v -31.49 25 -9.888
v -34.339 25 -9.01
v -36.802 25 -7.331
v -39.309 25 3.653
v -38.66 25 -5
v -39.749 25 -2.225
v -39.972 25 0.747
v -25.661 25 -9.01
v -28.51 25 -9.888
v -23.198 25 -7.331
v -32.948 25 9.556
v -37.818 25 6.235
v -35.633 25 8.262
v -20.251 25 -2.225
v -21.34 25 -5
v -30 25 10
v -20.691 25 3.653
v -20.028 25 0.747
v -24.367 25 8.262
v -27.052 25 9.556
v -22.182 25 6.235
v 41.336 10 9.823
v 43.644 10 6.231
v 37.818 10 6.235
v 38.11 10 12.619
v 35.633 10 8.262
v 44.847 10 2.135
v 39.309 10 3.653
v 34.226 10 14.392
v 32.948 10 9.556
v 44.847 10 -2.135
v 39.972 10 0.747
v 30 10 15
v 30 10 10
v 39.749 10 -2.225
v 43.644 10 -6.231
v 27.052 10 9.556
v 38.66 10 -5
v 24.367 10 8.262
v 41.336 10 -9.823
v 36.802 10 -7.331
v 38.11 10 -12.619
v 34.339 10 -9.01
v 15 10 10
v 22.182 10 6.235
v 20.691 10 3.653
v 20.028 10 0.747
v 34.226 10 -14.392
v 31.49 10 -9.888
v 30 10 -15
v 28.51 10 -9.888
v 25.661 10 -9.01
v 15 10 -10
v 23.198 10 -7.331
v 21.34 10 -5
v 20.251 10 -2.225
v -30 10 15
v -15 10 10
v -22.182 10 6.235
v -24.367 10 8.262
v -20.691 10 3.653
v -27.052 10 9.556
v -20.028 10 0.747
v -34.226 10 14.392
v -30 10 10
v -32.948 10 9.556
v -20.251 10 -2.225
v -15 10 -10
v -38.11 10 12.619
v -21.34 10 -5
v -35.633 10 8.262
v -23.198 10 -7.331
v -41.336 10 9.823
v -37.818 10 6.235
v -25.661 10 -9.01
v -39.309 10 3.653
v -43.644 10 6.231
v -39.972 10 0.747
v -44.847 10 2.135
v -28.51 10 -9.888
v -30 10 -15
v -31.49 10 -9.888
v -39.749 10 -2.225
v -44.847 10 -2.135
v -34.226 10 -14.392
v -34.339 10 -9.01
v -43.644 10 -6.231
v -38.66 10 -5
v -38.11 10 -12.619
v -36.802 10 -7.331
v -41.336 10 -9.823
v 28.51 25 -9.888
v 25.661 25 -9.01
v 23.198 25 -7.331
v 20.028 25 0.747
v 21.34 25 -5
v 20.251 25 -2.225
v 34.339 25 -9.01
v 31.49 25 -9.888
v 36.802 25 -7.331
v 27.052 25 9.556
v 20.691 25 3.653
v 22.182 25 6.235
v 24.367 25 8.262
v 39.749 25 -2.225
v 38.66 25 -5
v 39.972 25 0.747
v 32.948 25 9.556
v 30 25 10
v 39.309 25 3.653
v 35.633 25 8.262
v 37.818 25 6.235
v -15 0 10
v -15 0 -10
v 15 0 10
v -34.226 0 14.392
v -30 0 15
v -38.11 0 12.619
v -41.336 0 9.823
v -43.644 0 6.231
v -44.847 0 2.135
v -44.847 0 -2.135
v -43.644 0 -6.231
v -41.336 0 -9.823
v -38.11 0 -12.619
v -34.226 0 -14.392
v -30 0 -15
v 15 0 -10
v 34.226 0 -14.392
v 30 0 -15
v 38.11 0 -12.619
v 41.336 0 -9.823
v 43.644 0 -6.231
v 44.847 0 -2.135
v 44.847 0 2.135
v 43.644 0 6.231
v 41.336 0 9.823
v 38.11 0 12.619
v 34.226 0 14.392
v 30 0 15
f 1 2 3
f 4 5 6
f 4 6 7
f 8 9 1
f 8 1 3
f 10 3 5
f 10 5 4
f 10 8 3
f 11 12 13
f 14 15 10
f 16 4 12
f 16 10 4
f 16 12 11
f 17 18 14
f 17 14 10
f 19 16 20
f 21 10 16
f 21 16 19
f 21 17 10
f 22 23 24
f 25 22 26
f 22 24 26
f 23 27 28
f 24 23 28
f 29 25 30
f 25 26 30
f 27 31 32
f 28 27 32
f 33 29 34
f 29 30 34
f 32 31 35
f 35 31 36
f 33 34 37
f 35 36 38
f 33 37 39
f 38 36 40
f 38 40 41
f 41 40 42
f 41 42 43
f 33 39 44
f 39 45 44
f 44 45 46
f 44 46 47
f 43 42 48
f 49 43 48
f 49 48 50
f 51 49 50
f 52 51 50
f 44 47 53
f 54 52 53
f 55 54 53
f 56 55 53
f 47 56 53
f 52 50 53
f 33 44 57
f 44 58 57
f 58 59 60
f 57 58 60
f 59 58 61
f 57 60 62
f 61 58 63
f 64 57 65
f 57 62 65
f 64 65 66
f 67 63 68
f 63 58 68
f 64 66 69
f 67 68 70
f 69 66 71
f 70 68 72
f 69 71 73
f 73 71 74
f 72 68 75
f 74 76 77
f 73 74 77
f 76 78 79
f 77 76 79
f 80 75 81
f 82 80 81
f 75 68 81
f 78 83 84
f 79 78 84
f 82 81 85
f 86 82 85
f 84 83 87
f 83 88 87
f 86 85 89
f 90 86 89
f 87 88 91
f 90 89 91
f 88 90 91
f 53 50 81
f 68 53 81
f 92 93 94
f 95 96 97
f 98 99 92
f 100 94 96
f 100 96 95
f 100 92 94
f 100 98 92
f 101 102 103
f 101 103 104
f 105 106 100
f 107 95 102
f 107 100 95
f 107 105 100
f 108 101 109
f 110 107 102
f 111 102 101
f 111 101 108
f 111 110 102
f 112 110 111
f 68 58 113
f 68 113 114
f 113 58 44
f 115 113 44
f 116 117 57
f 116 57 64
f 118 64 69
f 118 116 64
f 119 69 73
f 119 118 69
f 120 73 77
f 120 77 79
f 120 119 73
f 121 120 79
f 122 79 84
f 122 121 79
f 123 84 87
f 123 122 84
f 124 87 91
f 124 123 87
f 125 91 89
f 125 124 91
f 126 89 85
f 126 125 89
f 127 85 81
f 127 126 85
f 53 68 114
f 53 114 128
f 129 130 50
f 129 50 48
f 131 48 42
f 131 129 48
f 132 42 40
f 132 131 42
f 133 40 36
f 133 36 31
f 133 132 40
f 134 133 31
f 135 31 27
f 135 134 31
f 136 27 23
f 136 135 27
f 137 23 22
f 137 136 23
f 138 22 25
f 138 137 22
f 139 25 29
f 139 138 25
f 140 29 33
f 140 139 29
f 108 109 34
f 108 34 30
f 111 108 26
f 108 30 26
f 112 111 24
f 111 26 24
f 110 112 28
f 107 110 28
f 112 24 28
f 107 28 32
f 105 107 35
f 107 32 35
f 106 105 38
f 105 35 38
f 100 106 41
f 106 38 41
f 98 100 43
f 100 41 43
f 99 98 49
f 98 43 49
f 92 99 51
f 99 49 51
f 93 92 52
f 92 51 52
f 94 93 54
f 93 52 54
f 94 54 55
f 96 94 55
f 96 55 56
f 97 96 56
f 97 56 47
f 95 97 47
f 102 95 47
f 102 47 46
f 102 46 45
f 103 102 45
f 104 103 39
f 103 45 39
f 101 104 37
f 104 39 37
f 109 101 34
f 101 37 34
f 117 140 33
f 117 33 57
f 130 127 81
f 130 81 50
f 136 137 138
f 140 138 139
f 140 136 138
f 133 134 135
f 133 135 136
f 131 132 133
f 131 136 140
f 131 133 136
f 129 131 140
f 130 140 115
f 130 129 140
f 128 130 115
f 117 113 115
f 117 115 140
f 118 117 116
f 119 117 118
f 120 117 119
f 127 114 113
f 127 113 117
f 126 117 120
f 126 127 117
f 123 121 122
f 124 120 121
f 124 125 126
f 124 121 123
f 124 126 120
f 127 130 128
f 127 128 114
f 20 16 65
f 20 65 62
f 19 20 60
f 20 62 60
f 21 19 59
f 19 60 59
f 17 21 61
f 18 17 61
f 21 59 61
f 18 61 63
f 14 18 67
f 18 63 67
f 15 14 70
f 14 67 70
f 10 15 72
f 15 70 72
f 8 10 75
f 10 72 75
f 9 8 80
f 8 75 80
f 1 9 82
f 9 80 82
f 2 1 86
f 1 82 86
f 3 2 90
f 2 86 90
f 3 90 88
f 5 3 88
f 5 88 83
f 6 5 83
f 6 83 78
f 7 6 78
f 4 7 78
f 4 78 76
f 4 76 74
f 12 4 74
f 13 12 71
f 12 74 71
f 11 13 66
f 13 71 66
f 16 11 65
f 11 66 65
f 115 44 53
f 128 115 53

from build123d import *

# Parameters (mm, degrees)
BOSS_EXTRUDE1_DEPTH = 10
SKETCH2_W           = 30
SKETCH2_H           = 20
CUT_EXTRUDE1_DEPTH  = 10
SKETCH3_R           = 10
BOSS_EXTRUDE2_DEPTH = 15


with BuildPart() as part:
    # Sketch1 → Boss-Extrude1 (new body)
    with BuildSketch(Plane(origin=(0, 0, 0), x_dir=(1, 0, 0), z_dir=(0, 1, 0))):
        with BuildLine():
            Line((30, -15), (-30, -15))
            ThreePointArc((-30, -15), (-45, 0), (-30, 15))
            Line((-30, 15), (30, 15))
            ThreePointArc((30, 15), (45, 0), (30, -15))
        make_face()
    extrude(amount=BOSS_EXTRUDE1_DEPTH)

    # Sketch2 → Cut-Extrude1 (cut)
    with BuildSketch(Plane(origin=(0, 10, 0), x_dir=(1, 0, 0), z_dir=(0, 1, 0))):
        Rectangle(SKETCH2_W, SKETCH2_H)
    extrude(amount=-CUT_EXTRUDE1_DEPTH, mode=Mode.SUBTRACT)

    # Sketch3 → Boss-Extrude2 (add)
    with BuildSketch(Plane(origin=(0, 10, 0), x_dir=(1, 0, 0), z_dir=(0, 1, 0))):
        with Locations(Location((-30, 0, 0), (0, 0, 270))):
            Circle(SKETCH3_R)
        with Locations(Location((30, 0, 0), (0, 0, 270))):
            Circle(SKETCH3_R)
    extrude(amount=BOSS_EXTRUDE2_DEPTH)


solid = part.part
